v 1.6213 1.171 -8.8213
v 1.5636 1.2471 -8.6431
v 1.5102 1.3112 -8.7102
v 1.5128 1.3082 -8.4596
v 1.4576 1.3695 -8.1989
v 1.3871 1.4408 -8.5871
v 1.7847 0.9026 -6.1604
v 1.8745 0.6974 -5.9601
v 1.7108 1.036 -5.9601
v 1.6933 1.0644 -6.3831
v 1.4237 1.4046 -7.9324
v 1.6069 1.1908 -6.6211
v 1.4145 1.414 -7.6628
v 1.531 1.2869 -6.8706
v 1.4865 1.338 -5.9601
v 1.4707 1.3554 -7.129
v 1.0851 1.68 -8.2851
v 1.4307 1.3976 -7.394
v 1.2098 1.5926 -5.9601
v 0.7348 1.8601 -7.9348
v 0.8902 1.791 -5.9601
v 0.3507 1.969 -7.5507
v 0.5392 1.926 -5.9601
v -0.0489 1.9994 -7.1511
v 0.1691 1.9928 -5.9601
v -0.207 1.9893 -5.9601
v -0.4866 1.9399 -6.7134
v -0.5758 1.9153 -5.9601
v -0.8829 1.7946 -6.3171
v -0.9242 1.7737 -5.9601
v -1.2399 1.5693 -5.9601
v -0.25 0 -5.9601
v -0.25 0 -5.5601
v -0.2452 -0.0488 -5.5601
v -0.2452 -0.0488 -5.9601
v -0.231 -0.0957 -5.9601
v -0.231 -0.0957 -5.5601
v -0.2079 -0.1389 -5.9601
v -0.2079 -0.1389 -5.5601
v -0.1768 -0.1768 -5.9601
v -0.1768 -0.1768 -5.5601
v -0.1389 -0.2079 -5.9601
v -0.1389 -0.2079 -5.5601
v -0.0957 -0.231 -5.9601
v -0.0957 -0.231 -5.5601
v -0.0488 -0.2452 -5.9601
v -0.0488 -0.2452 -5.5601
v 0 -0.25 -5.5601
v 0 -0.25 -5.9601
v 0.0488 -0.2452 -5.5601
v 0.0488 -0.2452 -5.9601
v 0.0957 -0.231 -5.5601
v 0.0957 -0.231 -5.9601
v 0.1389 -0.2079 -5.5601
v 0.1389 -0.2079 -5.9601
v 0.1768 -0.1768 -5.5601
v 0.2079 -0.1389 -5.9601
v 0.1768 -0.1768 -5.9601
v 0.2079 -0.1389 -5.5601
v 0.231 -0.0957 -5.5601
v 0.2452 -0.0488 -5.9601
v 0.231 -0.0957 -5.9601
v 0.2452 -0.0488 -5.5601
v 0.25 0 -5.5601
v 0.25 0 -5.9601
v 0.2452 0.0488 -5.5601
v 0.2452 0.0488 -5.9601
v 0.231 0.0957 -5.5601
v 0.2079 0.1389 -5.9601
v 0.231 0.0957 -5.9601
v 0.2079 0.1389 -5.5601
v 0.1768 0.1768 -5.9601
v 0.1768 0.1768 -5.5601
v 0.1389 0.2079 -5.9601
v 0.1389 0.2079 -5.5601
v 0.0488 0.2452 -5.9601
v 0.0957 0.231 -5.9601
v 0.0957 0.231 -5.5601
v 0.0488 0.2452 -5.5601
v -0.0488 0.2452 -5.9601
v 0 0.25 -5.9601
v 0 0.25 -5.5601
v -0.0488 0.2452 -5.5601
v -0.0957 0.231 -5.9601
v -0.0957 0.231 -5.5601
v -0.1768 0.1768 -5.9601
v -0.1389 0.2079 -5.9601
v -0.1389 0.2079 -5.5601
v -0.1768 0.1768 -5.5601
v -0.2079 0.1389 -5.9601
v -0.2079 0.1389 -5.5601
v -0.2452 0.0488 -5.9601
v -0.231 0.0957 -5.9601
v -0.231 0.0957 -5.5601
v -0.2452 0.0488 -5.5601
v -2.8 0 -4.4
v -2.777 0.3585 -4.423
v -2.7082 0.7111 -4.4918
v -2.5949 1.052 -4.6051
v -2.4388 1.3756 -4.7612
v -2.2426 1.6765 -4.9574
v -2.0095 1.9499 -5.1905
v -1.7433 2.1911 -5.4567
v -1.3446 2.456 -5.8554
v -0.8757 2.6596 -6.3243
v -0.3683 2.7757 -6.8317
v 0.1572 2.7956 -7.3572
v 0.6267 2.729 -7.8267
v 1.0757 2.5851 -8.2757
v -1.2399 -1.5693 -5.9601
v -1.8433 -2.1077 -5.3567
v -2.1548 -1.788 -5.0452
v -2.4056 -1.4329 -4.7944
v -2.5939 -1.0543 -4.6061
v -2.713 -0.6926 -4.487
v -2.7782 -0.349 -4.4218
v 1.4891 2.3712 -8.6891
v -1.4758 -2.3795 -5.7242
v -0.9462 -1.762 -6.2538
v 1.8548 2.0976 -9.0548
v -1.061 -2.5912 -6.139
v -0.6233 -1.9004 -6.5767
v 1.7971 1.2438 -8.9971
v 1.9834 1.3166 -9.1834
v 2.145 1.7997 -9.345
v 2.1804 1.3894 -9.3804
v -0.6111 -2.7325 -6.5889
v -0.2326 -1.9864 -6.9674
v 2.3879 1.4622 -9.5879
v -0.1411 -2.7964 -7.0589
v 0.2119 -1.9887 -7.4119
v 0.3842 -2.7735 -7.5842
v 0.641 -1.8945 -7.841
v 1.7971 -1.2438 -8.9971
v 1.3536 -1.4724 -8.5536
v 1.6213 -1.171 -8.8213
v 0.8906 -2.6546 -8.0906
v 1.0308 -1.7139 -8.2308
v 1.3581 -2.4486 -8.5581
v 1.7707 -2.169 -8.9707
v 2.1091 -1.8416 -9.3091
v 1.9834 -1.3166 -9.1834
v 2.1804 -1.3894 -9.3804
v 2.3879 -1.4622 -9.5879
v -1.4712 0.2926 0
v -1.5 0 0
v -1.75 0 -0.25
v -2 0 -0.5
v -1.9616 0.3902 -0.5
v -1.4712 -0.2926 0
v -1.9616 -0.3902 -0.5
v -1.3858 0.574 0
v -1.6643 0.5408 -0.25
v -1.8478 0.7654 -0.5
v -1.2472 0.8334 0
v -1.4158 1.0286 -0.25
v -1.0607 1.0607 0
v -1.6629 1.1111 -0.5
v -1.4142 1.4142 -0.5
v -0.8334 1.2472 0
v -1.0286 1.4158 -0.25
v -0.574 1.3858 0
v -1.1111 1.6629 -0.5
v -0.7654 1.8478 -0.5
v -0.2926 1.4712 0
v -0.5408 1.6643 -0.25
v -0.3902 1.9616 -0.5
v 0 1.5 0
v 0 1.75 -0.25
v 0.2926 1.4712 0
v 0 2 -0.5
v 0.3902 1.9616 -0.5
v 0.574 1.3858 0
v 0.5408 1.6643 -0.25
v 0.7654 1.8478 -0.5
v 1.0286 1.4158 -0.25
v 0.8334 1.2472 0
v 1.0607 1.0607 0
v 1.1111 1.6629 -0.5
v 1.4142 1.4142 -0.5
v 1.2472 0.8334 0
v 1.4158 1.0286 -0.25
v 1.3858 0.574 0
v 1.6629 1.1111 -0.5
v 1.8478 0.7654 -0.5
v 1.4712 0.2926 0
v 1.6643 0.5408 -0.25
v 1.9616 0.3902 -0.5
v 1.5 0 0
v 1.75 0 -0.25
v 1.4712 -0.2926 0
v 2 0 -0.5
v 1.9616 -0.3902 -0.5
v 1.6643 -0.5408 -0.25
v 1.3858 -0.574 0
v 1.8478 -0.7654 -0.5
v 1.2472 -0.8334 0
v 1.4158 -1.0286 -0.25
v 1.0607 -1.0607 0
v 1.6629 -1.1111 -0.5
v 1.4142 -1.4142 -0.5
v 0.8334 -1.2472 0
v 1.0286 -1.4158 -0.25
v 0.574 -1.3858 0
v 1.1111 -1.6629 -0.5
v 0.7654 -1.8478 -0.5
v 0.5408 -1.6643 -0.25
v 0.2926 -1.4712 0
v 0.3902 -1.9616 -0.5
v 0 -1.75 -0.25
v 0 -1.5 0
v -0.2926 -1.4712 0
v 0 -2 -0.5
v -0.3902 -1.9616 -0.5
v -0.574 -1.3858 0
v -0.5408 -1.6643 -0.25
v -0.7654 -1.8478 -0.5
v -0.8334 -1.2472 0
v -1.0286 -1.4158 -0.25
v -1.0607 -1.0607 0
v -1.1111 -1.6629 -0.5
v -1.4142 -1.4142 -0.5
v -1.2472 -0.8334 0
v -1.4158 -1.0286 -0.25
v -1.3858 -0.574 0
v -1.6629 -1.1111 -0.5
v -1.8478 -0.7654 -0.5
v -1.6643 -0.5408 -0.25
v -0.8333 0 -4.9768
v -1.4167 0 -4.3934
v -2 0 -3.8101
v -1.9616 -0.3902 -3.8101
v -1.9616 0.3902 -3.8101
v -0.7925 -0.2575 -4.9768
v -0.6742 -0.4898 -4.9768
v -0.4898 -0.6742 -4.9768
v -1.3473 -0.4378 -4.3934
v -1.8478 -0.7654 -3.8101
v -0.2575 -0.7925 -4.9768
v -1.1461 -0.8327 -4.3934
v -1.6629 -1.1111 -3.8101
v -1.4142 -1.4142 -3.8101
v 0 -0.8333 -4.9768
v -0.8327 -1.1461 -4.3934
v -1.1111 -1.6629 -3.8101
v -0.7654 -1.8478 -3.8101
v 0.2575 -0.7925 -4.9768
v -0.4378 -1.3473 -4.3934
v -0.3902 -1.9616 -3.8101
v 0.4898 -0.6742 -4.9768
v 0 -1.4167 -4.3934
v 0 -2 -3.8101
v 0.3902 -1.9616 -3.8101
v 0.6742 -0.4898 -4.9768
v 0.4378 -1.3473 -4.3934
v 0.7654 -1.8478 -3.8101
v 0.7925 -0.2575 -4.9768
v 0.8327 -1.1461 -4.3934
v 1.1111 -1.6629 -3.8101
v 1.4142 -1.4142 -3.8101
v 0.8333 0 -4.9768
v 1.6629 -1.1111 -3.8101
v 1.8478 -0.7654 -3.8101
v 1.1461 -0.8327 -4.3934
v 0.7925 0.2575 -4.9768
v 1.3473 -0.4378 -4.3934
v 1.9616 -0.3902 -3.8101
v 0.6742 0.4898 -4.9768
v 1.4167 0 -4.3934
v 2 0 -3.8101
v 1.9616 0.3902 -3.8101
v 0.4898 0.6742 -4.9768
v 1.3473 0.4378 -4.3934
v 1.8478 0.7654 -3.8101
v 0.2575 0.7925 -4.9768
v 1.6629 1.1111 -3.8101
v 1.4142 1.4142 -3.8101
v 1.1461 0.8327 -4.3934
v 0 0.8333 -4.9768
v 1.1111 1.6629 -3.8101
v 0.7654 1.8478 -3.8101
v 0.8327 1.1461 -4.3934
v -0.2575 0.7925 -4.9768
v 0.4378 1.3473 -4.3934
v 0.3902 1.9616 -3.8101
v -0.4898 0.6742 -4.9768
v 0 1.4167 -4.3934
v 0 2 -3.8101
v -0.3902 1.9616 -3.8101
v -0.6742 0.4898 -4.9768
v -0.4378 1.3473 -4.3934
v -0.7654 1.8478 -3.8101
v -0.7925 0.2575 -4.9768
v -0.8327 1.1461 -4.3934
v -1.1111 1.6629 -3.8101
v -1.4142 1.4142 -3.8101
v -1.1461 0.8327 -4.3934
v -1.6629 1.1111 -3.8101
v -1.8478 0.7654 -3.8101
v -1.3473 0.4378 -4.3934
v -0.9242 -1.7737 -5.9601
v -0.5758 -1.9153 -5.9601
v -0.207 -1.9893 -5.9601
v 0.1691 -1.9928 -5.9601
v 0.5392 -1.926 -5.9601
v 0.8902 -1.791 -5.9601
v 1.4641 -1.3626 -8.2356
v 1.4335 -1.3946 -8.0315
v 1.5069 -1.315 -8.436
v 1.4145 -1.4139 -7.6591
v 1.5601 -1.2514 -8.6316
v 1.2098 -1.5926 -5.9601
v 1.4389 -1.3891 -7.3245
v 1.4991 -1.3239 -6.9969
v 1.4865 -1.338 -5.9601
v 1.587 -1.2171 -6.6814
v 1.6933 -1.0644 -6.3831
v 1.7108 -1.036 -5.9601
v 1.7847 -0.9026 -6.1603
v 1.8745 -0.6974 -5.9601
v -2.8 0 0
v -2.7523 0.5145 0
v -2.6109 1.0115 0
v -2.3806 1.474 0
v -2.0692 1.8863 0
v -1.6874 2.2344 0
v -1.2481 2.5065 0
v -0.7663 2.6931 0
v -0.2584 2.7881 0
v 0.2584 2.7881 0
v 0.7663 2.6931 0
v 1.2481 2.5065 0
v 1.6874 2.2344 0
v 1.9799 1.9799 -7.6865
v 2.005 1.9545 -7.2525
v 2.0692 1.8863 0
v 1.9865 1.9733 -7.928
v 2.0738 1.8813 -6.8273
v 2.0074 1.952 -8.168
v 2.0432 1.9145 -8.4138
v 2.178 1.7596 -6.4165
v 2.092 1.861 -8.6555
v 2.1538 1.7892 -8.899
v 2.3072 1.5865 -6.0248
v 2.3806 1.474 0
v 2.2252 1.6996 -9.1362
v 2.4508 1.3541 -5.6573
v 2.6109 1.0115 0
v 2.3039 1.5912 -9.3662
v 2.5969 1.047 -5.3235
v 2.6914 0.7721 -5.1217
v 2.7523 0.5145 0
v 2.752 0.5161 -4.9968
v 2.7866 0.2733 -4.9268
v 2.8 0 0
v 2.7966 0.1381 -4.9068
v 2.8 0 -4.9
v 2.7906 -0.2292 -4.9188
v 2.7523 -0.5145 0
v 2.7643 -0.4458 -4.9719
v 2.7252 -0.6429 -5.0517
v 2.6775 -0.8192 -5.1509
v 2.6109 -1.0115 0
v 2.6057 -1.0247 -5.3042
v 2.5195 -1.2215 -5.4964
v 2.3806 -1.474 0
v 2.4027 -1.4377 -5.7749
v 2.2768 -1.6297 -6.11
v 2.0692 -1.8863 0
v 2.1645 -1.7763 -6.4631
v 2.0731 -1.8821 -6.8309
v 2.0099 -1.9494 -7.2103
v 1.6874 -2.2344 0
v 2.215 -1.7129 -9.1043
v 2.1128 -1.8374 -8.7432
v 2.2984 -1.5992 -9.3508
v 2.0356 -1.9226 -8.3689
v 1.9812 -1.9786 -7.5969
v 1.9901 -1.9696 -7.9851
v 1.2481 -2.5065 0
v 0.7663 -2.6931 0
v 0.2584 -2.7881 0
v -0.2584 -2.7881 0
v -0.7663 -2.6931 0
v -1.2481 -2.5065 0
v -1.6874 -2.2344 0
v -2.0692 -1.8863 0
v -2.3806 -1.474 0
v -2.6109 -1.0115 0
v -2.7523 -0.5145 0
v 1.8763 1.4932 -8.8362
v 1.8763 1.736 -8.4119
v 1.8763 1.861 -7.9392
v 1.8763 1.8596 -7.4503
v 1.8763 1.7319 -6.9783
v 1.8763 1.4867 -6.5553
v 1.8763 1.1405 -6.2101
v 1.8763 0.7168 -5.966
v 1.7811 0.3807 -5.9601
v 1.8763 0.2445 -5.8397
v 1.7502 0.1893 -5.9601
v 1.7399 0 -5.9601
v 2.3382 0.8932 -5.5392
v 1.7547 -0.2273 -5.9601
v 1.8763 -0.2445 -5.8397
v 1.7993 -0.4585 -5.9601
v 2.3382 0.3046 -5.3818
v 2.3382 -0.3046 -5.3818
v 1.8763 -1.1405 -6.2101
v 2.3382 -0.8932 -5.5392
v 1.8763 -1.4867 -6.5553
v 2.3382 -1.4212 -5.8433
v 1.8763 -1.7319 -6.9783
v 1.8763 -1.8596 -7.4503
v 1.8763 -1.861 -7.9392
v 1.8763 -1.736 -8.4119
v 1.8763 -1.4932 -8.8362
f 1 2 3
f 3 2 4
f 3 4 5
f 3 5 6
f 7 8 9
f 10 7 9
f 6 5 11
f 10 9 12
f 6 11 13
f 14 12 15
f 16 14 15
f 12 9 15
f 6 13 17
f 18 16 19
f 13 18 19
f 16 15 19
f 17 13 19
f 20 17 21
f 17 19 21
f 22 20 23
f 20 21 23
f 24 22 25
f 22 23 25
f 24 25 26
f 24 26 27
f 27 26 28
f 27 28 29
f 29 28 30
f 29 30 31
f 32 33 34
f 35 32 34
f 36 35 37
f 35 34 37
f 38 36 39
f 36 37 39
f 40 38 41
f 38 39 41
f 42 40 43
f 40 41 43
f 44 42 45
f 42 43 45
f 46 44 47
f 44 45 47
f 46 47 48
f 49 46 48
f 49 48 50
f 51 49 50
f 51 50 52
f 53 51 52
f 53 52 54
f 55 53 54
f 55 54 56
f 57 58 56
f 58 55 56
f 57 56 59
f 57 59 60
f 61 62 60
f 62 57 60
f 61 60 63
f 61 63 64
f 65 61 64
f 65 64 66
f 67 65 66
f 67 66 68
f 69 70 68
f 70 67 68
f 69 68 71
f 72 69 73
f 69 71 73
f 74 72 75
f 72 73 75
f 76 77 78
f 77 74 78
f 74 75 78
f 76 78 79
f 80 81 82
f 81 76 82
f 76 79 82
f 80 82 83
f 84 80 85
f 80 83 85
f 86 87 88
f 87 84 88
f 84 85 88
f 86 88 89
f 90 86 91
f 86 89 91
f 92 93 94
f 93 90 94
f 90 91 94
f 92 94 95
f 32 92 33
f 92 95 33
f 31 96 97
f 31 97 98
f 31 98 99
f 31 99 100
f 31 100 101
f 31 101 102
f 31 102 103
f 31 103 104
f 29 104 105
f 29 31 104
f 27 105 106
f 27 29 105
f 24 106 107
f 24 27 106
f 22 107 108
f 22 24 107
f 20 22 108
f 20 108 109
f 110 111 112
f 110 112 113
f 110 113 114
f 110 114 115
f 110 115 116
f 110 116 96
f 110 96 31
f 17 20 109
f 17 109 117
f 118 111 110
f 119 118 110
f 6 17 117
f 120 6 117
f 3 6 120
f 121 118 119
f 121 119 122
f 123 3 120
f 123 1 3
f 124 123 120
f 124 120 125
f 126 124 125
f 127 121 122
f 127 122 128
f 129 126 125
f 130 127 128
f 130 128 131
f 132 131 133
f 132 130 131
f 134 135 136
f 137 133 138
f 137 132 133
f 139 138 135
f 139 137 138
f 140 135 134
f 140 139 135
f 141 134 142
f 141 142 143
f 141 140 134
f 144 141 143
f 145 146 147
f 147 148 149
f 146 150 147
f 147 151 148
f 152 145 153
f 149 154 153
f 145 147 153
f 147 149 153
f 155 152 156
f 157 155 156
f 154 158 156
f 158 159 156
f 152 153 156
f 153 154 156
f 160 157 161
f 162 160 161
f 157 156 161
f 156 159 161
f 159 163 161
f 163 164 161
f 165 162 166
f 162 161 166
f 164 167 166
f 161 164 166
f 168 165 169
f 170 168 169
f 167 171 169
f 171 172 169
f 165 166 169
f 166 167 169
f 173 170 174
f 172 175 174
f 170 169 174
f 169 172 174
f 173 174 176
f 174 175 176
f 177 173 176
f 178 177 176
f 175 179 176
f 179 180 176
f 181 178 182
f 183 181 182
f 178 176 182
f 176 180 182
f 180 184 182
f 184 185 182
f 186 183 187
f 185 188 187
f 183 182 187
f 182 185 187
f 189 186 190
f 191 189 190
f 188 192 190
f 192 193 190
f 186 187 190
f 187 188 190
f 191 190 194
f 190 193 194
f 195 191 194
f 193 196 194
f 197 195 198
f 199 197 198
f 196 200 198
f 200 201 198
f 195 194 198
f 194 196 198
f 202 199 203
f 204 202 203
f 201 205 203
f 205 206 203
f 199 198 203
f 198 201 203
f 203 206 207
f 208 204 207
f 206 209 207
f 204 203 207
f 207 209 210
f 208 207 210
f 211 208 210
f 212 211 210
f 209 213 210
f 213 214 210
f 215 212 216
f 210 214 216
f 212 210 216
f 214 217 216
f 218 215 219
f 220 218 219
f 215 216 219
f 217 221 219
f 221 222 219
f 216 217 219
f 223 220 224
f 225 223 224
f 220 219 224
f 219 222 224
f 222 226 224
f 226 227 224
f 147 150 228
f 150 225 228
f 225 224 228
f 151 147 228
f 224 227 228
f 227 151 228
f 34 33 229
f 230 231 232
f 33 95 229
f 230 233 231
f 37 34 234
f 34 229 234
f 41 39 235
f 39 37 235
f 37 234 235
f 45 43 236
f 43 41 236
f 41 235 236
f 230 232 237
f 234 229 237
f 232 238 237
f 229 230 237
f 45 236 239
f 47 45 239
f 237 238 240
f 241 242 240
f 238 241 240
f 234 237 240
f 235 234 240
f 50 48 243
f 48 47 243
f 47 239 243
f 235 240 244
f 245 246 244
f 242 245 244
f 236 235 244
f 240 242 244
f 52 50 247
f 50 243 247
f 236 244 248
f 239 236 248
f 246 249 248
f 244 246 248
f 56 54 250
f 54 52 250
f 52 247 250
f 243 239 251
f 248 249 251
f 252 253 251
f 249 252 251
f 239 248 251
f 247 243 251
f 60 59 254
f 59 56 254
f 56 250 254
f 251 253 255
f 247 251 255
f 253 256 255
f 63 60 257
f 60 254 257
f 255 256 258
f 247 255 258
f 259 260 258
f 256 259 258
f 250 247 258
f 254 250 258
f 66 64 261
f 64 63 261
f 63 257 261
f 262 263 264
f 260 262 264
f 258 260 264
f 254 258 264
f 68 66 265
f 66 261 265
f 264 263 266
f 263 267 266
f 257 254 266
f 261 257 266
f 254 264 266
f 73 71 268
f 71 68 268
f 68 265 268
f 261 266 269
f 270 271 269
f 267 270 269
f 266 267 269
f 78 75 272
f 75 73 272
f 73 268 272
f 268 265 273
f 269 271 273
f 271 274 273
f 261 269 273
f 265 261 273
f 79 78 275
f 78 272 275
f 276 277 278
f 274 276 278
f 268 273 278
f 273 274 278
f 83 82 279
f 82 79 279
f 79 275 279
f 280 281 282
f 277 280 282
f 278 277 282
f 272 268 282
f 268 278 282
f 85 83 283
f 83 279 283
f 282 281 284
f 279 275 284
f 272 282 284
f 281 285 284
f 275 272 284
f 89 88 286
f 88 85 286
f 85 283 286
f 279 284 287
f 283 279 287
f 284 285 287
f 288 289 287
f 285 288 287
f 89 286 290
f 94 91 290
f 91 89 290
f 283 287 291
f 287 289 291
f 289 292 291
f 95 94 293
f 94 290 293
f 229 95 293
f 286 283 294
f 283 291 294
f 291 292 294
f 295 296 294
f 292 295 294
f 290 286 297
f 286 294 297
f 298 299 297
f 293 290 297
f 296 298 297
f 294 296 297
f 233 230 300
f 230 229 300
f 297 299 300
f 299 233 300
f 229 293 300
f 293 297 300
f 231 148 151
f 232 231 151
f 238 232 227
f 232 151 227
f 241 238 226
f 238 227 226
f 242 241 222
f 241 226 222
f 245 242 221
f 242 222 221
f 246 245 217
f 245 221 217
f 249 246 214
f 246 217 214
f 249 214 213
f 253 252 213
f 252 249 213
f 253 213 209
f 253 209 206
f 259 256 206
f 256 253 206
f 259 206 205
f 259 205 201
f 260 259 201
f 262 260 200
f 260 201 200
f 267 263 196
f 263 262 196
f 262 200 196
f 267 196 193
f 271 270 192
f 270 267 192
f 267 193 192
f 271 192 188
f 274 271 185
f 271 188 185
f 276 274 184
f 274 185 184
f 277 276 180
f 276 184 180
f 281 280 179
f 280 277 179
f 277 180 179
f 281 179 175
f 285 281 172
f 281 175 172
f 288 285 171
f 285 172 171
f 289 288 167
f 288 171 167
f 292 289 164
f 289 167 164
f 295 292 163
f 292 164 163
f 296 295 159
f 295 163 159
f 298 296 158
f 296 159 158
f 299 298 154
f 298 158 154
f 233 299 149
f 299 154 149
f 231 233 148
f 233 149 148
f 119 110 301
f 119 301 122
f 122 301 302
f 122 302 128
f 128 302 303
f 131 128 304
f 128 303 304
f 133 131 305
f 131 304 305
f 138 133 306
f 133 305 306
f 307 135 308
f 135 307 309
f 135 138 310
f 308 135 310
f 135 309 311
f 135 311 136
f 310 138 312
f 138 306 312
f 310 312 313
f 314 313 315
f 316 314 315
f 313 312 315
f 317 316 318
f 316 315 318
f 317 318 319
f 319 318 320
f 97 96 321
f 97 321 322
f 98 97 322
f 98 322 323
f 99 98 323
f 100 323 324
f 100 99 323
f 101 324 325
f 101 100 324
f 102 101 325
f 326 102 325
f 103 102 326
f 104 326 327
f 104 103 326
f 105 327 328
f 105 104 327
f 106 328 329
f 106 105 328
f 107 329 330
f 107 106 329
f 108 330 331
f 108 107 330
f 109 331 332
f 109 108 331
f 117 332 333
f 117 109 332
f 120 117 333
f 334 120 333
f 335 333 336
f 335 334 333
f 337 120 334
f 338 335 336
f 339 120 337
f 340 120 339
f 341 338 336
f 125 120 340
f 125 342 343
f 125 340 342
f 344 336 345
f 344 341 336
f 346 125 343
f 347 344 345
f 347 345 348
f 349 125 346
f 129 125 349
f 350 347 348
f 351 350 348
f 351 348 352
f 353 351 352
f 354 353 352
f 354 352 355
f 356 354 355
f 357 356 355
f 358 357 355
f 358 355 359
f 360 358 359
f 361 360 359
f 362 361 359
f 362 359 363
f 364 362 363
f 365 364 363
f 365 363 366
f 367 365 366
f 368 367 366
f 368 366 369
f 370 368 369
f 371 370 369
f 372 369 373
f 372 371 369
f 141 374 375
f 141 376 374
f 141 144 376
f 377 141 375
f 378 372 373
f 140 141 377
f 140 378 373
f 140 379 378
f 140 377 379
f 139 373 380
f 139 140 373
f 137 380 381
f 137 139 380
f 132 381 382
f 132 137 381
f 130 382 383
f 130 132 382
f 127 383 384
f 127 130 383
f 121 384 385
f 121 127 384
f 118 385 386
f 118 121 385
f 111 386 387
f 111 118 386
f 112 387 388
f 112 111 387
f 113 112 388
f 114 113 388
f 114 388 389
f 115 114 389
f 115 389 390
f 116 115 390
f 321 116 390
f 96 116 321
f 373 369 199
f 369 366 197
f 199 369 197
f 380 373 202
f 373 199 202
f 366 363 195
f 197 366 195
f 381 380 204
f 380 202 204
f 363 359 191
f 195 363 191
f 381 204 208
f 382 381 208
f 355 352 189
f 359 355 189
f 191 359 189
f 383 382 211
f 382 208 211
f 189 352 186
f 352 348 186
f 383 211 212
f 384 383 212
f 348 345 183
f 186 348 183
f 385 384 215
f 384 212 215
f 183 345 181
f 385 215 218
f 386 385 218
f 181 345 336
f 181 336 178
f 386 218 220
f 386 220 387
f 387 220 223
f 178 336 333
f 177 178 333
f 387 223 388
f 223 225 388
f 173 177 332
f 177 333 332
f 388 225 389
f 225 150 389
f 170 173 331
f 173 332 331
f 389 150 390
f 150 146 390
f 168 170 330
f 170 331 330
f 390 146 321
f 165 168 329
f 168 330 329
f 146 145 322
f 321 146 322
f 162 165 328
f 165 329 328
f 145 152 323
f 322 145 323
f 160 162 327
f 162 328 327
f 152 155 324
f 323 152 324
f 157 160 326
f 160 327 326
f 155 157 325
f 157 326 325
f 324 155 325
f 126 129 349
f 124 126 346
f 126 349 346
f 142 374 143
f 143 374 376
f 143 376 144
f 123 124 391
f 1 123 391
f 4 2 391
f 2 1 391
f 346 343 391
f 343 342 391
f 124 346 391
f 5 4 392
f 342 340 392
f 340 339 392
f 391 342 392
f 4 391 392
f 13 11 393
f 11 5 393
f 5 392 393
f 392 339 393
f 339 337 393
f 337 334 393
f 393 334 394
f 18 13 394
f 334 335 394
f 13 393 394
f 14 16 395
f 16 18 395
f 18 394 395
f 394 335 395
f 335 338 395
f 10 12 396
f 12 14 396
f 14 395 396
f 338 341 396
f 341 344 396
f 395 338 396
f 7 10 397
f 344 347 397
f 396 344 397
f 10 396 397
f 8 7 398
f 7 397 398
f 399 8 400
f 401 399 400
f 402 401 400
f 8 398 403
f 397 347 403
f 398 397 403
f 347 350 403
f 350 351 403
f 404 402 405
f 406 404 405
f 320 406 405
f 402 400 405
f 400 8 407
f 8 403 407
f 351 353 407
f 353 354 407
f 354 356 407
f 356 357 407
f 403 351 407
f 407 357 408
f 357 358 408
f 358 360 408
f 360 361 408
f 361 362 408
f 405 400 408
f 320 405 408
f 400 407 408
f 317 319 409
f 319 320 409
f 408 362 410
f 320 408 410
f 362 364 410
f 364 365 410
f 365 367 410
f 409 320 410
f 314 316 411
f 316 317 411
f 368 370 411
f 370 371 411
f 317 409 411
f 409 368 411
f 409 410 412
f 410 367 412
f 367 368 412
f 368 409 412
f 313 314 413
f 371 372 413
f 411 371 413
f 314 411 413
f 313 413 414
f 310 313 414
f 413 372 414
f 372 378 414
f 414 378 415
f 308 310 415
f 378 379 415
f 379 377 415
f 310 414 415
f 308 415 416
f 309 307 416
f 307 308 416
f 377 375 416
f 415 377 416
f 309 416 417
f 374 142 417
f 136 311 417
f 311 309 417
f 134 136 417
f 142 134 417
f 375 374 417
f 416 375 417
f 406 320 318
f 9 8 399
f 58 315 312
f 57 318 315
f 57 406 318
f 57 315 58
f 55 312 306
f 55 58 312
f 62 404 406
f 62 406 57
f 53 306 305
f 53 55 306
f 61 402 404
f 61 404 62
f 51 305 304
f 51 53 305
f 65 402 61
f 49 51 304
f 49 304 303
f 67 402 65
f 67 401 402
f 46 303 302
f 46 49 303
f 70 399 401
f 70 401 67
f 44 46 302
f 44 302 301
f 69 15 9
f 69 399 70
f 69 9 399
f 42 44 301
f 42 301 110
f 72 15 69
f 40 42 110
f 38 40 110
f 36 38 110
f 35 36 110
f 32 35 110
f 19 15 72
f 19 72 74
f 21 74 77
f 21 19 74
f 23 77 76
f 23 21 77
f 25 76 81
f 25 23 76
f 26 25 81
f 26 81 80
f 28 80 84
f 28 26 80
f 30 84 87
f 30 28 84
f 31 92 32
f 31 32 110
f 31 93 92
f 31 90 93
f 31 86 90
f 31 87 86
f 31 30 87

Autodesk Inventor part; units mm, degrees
ref_plane "YZ Plane" through (0, 0, 0) normal (1, 0, 0) x (0, 1, 0)
ref_plane "XZ Plane" through (0, 0, 0) normal (0, 1, 0) x (-1, 0, 0)
ref_plane "XY Plane" through (0, 0, 0) normal (0, 0, 1) x (1, 0, 0)
sketch "Sketch1" plane through (0, 0, 0) normal (0, 1, 0) x (-1, 0, 0)
  line L0 (0, 0) -> (0, -1.3956)
  line L1 (1.5, 0) -> (2.8, 0)
  line L2 (2.8, 0) -> (2.8, -10)
  line L3 (2.8, -10) -> (2, -10)
  line L4 (2, -10) -> (2, -0.5)
  line L5 (2, -5.9601) -> (0.25, -5.9601)
  line L6 (0.25, -5.9601) -> (0.25, -5.5601)
  line L7 (0.25, -5.5601) -> (2, -3.8101)
  line L8 (2, -3.8101) -> (2, -5.9601)
  line L9 (2.8, -4.4) -> (-2.8, -10)
  line L10 (-2.8, -10) -> (2.8, -10)
  line L11 (-2.8, -10) -> (-2.0623, -10)
  line L12 (2, -0.5) -> (1.5, 0)
  line L13 (0, -7.2) -> (0, -7.7) construction
  line L14 (0, -7.7) -> (-4.7359, -7.7)
  line L15 (-4.7359, -7.7) -> (-4.7359, -2.9641)
  line L16 (-4.7359, -2.9641) -> (0, -7.7)
  point P0 (2, -3.8101)
  point P1 (0, -10)
  point P2 (2, -10)
  point P3 (2, -5.2)
  point P4 (0.9439, -6.2561)
  point P5 (1.2399, -5.9601)
  point P6 (0.2, -7)
  point P7 (2, -5.2)
  point P8 (-0.5, -7.7)
  point P9 (-0.25, -7.45)
  dimension "d1" = 10
  dimension "d4" = 2
  dimension "d10" = 45
  dimension "d19" = 0.8
  dimension "d21" = 1.5
  dimension "d23" = 45
  dimension "d24" = 45
  dimension "d25" = 0.25
  dimension "d26" = 0.4
  dimension "d27" = 0.7
  dimension "d30" = 0.5
  dimension "d31" = 45
revolve "Revolution1" add sketch "Sketch1" angle 360 about axis through (0, 0, 0) along (0, 0, -1) contours L1 L2 L9 L4 L12 | L2 L3 L4 L9 | L4 L9 L5 L6 L7 | L4 L5 L9
extrude "Extrusion4" cut sketch "Sketch1" along normal mid plane 25.4 contours L2 L3 L4 L9 | L4 L5 L9 | L10 L9 L14 L16 L5 L4 | L16 L14 L9
revolve "Revolution3" cut sketch "Sketch1" angle 360 about axis through (0, 0, -7.7) along (1, 0, 0) contours L9 L14 L15 L16
properties part number "aperature"
